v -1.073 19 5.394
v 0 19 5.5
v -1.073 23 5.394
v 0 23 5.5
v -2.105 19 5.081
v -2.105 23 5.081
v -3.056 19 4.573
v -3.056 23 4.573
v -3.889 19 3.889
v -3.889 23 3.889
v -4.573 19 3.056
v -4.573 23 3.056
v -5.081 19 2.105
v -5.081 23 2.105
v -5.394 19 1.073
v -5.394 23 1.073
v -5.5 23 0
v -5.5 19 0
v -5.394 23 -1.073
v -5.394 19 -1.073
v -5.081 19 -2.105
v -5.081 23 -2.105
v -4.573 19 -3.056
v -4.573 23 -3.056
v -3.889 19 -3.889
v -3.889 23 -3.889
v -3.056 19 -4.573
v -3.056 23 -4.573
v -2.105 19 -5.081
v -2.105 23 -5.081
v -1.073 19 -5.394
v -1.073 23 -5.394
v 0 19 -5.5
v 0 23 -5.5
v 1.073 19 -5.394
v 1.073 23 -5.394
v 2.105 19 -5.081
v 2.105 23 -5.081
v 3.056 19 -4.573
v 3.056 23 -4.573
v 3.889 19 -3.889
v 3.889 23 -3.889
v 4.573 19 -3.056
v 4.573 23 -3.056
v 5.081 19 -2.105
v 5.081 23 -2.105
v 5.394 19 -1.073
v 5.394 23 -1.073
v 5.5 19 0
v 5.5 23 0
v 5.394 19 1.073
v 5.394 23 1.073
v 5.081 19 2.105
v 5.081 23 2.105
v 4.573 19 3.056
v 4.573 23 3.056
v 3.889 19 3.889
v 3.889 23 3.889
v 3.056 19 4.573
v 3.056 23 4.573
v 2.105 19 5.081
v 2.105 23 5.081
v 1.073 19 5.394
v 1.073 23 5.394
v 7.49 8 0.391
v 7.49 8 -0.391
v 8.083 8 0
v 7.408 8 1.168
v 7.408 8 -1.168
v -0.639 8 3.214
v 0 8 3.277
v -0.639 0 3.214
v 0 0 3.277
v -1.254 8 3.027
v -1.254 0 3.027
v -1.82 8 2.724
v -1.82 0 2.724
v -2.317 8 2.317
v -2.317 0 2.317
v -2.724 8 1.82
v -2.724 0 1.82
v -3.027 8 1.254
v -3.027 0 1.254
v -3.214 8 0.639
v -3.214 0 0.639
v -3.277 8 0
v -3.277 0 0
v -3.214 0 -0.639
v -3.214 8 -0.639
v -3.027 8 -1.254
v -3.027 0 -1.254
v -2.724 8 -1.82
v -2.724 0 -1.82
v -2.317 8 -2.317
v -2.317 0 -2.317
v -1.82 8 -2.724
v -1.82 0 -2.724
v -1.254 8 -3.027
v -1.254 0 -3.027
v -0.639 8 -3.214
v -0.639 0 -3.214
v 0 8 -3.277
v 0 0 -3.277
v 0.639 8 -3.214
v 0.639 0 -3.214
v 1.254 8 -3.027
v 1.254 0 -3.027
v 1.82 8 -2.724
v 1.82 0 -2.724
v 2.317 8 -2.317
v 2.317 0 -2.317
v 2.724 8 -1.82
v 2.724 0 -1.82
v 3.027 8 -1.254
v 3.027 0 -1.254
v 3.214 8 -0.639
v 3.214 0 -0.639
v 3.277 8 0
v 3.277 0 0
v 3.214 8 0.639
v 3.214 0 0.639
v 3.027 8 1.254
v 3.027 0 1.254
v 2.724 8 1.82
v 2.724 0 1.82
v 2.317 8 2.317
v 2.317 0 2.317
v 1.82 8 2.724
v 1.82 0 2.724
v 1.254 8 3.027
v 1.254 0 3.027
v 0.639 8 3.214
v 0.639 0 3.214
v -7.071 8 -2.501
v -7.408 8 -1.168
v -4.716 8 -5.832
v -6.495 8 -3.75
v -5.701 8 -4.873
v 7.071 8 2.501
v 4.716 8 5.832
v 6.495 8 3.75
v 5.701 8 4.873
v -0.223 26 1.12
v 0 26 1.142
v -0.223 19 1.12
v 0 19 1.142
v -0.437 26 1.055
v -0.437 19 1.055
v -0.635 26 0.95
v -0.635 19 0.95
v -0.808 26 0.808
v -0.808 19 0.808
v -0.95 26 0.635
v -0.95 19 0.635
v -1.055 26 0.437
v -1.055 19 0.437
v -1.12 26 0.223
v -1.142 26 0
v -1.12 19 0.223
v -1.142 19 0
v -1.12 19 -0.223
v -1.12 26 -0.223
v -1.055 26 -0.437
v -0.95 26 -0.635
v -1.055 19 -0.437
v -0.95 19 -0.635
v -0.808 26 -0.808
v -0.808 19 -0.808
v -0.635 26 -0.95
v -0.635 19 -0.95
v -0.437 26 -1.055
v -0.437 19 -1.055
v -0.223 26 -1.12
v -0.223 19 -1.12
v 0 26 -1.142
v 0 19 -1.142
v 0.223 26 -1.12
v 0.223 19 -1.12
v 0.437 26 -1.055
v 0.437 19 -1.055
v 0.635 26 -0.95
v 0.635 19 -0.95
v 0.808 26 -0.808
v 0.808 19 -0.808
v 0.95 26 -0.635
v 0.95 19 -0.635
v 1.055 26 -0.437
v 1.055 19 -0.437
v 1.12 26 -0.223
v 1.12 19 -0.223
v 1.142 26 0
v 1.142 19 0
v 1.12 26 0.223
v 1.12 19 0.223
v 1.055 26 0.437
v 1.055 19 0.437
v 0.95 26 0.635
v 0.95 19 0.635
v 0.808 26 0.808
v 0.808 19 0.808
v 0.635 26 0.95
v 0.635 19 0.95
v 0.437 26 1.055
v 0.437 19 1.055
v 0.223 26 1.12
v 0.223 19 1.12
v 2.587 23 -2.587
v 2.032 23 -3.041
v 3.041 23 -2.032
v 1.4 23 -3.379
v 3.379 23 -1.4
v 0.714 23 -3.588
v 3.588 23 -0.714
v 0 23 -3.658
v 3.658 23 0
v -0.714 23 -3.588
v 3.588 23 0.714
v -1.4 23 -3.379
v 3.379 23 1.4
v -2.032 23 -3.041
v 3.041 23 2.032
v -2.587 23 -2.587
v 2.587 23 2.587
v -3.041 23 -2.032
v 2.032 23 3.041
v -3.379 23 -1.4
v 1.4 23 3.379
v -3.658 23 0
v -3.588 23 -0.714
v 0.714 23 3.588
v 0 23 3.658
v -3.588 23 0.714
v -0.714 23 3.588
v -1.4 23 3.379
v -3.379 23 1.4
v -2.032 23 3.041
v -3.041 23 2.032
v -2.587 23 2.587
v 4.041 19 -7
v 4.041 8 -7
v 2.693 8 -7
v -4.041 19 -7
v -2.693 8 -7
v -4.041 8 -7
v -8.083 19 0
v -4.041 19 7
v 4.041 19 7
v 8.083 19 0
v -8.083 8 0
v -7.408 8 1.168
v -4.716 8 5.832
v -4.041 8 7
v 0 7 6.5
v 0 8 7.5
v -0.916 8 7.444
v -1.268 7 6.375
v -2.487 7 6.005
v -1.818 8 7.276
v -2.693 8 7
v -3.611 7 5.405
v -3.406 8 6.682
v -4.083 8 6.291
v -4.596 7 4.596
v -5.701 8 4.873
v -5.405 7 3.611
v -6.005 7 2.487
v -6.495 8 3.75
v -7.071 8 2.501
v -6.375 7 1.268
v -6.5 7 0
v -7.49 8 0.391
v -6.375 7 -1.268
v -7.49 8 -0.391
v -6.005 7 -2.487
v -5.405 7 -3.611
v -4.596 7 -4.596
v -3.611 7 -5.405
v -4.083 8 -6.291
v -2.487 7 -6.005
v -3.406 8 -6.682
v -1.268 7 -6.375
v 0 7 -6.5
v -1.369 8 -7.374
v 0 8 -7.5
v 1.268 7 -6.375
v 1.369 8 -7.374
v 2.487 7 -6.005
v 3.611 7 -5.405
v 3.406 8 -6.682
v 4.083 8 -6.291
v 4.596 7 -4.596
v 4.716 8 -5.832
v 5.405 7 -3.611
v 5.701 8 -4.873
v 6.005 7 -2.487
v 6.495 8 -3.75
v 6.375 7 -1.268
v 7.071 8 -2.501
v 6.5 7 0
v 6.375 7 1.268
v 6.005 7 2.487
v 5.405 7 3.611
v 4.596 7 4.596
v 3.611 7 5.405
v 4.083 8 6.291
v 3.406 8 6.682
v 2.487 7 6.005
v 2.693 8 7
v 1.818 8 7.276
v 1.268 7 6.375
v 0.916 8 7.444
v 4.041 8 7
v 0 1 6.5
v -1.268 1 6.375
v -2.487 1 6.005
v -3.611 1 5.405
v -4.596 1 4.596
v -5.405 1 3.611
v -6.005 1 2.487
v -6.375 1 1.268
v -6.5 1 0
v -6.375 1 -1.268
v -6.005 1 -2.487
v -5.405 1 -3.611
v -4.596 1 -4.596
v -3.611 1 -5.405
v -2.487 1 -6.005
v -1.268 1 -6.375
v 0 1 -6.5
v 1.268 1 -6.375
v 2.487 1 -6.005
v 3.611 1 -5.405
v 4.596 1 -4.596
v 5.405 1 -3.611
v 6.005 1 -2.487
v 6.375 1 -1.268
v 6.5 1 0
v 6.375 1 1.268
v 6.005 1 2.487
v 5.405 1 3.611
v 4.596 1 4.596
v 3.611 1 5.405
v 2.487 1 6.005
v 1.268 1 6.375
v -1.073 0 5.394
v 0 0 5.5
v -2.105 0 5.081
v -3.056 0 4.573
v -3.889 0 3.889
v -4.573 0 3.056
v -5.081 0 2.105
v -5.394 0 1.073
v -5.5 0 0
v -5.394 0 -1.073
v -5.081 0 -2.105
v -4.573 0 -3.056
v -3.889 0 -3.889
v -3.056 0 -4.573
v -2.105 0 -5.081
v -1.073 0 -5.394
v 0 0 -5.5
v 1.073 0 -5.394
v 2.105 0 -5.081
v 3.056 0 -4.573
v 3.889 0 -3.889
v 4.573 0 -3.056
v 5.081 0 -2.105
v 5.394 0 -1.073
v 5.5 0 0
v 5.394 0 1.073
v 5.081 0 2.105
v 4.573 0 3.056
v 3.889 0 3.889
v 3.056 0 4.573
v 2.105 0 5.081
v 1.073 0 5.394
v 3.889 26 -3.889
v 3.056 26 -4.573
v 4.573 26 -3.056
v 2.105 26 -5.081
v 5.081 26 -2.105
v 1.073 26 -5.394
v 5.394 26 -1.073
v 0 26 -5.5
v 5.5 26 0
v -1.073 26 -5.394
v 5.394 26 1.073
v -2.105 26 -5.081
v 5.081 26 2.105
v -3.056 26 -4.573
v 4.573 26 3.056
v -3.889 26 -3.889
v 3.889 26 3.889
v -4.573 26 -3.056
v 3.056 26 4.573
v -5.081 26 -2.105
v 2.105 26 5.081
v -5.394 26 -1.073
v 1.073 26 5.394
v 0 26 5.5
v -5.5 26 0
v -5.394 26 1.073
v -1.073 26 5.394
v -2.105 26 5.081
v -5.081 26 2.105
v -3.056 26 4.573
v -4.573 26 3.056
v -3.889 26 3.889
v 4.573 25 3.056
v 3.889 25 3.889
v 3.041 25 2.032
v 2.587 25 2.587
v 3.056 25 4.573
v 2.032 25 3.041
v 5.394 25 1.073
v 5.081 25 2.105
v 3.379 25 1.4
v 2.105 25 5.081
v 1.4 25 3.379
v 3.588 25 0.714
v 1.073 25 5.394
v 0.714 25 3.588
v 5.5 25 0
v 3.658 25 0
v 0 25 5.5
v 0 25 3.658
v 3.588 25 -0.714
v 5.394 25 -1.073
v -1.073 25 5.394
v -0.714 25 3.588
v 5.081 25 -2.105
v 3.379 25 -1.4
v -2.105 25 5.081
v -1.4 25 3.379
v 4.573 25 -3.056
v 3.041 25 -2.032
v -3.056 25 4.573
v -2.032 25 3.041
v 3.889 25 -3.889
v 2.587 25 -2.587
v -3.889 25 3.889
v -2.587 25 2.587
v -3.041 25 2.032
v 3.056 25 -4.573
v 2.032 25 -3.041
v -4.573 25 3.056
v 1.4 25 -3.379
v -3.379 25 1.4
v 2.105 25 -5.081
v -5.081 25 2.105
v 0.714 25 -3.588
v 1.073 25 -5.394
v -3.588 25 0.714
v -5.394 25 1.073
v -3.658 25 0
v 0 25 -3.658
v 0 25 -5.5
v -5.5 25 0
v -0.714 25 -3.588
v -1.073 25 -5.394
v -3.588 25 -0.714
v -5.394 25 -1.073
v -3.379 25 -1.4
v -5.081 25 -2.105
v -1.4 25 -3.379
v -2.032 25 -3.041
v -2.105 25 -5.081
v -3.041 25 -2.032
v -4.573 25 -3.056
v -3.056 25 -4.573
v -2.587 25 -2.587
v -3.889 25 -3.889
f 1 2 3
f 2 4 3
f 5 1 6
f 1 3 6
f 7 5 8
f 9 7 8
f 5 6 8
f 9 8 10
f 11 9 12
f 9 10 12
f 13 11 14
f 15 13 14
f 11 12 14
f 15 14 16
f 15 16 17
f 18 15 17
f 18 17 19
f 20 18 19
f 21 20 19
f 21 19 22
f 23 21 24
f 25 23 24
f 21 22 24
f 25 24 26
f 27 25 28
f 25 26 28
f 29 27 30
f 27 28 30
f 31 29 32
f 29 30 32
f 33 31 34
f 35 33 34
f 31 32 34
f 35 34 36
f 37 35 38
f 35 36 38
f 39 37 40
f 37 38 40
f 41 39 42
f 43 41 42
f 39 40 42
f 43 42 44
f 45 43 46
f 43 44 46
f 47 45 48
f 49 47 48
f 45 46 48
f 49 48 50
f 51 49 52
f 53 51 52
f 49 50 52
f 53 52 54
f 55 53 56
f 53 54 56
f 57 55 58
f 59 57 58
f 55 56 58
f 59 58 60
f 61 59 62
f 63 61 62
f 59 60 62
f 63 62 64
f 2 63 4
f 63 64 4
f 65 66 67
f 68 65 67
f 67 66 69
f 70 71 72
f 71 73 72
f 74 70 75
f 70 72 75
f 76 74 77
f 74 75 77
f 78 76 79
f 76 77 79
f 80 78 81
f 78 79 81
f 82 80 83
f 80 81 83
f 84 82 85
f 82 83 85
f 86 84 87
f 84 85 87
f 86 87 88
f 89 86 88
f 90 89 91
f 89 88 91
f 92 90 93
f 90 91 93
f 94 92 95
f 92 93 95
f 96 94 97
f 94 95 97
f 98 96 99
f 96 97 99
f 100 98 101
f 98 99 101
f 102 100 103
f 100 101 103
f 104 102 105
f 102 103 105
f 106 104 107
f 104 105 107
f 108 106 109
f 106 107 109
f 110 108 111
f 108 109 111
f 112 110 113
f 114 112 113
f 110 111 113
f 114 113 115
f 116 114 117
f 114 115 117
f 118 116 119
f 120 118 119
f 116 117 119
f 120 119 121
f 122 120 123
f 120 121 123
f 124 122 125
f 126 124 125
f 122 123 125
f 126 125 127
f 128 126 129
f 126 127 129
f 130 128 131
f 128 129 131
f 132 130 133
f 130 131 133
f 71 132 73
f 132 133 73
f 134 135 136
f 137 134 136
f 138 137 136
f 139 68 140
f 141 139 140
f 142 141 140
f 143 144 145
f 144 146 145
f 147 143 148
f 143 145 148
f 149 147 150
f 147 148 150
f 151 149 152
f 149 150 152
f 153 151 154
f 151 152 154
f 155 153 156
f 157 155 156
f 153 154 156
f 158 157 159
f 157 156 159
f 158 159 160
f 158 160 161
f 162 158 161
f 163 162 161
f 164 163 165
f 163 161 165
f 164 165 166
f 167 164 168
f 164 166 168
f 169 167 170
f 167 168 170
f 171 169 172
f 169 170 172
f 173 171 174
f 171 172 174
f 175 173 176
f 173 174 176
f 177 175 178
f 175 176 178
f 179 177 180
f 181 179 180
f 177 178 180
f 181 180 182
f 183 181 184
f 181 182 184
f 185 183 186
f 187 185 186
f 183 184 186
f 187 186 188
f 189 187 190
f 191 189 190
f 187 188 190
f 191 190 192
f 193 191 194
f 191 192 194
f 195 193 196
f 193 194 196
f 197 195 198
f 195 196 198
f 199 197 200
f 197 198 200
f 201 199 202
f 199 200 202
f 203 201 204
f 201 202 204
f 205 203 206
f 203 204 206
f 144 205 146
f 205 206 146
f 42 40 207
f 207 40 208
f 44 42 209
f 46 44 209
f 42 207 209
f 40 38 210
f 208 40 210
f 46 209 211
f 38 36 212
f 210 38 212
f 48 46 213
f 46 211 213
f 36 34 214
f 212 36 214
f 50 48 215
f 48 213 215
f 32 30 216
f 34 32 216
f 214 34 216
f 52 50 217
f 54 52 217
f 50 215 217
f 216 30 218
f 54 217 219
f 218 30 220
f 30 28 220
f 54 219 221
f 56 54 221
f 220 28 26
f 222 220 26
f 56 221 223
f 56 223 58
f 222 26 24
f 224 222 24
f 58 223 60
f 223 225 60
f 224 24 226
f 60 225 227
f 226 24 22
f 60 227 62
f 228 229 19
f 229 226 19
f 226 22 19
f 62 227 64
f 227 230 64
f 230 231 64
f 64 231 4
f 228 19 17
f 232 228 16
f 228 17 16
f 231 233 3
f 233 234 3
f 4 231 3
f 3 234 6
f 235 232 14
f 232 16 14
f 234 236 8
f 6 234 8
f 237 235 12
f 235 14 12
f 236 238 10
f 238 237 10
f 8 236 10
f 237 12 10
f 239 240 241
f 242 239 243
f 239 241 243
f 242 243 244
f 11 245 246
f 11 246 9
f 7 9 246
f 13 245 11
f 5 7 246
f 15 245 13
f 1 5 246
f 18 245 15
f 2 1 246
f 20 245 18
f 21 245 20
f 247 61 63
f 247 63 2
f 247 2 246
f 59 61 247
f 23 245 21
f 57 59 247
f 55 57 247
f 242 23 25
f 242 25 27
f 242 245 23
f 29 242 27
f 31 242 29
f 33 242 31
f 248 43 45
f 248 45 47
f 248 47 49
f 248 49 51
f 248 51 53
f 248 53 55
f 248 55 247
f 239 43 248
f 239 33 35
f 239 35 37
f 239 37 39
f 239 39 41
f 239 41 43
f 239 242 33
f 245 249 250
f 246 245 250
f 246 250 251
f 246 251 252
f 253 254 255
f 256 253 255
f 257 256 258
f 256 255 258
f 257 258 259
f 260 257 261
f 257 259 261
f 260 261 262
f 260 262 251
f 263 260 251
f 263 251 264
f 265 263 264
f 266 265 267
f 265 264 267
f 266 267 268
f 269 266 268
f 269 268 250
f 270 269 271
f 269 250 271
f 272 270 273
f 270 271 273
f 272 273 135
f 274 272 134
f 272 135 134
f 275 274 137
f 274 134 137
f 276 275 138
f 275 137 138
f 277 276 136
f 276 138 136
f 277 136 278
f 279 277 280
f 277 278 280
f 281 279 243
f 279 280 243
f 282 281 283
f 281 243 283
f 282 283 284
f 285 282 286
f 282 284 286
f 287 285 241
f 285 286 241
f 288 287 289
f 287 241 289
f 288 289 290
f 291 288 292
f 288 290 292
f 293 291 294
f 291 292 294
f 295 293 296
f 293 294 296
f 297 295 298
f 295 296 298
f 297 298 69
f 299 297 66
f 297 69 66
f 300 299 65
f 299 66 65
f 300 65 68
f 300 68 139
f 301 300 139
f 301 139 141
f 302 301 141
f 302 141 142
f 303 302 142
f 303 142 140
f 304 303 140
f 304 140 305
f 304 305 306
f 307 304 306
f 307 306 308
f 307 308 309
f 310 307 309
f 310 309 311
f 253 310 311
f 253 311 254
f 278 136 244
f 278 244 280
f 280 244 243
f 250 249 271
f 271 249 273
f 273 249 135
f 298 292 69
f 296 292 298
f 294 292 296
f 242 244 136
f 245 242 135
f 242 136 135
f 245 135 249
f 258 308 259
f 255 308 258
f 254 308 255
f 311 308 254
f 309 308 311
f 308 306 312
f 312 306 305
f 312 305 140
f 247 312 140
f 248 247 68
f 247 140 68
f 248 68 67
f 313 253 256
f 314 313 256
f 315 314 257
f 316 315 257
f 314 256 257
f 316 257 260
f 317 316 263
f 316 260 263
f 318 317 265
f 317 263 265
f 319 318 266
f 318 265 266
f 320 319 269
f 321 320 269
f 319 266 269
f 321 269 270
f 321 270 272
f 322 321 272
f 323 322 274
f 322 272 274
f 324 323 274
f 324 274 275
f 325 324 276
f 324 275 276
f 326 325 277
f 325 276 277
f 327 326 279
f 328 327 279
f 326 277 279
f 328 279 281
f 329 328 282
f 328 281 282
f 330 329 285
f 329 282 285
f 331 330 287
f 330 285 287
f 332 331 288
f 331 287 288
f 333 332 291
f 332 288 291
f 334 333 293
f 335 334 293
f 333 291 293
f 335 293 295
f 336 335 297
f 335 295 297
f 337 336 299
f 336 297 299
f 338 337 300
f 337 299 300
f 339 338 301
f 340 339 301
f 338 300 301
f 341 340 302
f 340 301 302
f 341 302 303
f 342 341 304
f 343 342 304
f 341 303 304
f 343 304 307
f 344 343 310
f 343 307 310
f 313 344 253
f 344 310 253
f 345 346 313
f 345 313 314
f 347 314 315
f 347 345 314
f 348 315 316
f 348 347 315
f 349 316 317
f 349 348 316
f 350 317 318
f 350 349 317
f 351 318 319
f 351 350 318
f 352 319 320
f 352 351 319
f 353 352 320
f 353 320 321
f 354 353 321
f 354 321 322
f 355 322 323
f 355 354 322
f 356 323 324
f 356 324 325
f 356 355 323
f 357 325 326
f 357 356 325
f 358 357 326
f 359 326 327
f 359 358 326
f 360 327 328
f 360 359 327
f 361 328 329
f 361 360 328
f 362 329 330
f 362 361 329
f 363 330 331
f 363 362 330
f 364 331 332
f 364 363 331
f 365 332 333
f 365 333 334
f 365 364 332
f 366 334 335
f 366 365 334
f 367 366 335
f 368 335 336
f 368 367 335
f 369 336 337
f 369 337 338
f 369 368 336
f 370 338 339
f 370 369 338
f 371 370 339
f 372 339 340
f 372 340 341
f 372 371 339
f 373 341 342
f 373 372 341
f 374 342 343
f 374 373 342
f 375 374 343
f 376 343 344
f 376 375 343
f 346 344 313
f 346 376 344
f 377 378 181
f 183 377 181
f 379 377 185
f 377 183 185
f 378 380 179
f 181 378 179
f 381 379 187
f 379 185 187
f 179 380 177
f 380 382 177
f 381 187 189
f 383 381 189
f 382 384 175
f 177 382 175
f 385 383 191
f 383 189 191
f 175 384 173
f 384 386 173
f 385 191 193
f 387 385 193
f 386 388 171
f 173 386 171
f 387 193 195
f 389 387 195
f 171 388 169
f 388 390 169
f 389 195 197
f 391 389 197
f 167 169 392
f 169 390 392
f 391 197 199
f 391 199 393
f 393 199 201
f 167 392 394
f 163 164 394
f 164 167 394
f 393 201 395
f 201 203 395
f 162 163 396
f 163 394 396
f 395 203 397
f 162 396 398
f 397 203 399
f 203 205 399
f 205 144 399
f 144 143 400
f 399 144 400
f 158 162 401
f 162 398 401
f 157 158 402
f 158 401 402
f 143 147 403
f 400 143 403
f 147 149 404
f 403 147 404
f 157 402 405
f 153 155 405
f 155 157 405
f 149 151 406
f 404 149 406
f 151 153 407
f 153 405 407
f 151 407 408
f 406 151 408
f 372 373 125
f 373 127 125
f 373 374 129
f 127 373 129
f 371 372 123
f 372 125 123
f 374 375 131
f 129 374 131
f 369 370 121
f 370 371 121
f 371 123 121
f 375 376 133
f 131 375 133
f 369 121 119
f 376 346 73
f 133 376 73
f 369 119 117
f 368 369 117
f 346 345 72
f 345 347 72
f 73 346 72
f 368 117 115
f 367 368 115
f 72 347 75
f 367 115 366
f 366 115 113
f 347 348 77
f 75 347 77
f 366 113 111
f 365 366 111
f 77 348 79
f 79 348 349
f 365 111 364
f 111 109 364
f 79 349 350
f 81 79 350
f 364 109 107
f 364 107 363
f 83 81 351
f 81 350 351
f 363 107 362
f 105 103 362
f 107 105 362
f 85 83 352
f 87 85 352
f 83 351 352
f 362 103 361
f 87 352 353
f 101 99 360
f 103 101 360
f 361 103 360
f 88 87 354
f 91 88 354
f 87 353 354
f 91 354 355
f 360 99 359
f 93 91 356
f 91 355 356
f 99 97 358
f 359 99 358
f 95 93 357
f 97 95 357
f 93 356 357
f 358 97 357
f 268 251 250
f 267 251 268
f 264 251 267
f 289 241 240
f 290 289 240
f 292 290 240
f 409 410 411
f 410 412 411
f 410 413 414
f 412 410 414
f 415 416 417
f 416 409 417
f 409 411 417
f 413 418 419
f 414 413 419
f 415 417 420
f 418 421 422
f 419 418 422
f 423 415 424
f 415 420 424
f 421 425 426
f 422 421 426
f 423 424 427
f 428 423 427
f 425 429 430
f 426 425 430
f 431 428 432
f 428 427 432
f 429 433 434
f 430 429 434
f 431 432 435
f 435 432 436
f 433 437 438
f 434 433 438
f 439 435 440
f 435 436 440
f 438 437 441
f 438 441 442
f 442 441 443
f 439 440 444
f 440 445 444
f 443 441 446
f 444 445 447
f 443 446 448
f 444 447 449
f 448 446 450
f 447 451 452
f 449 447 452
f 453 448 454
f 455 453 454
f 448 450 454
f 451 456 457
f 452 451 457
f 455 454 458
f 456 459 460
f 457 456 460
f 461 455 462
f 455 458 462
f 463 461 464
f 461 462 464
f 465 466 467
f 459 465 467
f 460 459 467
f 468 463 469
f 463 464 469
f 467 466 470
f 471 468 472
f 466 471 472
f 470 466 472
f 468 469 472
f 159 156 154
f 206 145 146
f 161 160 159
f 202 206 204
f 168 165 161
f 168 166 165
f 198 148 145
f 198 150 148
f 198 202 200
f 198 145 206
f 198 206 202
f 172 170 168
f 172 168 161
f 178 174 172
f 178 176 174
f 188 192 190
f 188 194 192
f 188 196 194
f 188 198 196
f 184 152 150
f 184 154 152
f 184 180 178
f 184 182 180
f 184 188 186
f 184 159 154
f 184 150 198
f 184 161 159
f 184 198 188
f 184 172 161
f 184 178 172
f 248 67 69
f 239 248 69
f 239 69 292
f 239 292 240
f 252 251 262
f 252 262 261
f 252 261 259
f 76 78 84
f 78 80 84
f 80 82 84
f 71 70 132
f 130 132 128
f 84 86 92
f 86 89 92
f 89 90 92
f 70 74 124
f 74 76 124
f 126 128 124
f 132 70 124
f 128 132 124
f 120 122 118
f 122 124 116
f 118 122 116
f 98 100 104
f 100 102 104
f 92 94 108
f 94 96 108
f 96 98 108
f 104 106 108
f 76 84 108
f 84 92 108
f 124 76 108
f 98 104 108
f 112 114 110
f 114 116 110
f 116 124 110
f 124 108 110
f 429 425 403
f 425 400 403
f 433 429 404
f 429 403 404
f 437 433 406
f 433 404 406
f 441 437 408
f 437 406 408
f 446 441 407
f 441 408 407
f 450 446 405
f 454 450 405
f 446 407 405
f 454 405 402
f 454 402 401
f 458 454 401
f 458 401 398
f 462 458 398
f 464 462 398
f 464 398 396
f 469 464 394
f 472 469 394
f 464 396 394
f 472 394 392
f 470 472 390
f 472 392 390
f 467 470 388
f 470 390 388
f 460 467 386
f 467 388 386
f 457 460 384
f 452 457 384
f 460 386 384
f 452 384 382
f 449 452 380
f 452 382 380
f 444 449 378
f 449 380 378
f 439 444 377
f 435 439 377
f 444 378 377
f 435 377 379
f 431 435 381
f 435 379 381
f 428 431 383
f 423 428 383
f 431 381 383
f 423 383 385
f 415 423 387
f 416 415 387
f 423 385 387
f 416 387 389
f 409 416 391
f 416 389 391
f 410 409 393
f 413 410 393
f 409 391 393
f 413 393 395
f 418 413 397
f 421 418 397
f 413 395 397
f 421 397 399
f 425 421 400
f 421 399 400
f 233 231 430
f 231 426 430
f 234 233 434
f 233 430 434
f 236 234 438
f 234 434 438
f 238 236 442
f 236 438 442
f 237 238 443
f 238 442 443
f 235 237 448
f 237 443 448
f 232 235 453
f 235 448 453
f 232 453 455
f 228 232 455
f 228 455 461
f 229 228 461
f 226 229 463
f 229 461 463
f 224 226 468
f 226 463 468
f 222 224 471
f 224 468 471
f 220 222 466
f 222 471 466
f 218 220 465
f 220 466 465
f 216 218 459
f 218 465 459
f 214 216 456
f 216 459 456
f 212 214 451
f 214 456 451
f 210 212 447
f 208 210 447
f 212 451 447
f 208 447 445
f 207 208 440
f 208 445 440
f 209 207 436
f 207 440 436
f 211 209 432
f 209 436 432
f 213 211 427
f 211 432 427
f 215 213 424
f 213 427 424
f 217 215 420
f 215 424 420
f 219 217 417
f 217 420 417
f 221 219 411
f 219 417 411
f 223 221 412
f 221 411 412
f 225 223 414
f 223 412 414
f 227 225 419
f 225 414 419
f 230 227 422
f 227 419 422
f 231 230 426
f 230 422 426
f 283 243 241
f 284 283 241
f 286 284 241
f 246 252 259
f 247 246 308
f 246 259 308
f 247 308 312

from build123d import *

# Parameters (mm, degrees)
BOSS_EXTRUDE1_DEPTH = 11
CHAMFER1_SIZE       = 1


with BuildPart() as part:
    # Sketch1 → Revolve1 (revolve)
    with BuildSketch(Plane.XY, mode=Mode.PRIVATE) as revolve1_sk:
        Polygon((3.276548208, 0), (6.5, 0), (6.5, 7), (7.5, 8), (3.276548208, 8), align=None)
    revolve(revolve1_sk.sketch.rotate(Axis((0, 18.90634256, 0), (0, -1, 0)), 90), axis=Axis((0, 18.90634256, 0), (0, -1, 0)))

    # Sketch2 → Boss-Extrude1 (add)
    with BuildSketch(Plane(origin=(0, 8, 0), x_dir=(1, 0, 0), z_dir=(0, 1, 0))):
        Polygon((8.082903769, 0), (4.041451884, 7), (-4.041451884, 7), (-8.082903769, 0), (-4.041451884, -7), (4.041451884, -7), align=None)
    extrude(amount=BOSS_EXTRUDE1_DEPTH)

    # Sketch3 → Revolve3 (revolve)
    with BuildSketch(Plane.XY, mode=Mode.PRIVATE) as revolve3_sk:
        Polygon((5.5, 19), (5.5, 23), (3.657937283, 23), (3.657937283, 25), (5.5, 25), (5.5, 26), (1.142283078, 26), (1.142283078, 19), align=None)
    revolve(revolve3_sk.sketch.rotate(Axis((0, 22.925153464, 0), (0, -1, 0)), 90), axis=Axis((0, 22.925153464, 0), (0, -1, 0)))

    # Chamfer1
    chamfer1_edges = [part.edges().sort_by_distance(p)[0] for p in [
        (0, 0, -6.5),
    ]]
    chamfer(chamfer1_edges, length=CHAMFER1_SIZE)


solid = part.part
